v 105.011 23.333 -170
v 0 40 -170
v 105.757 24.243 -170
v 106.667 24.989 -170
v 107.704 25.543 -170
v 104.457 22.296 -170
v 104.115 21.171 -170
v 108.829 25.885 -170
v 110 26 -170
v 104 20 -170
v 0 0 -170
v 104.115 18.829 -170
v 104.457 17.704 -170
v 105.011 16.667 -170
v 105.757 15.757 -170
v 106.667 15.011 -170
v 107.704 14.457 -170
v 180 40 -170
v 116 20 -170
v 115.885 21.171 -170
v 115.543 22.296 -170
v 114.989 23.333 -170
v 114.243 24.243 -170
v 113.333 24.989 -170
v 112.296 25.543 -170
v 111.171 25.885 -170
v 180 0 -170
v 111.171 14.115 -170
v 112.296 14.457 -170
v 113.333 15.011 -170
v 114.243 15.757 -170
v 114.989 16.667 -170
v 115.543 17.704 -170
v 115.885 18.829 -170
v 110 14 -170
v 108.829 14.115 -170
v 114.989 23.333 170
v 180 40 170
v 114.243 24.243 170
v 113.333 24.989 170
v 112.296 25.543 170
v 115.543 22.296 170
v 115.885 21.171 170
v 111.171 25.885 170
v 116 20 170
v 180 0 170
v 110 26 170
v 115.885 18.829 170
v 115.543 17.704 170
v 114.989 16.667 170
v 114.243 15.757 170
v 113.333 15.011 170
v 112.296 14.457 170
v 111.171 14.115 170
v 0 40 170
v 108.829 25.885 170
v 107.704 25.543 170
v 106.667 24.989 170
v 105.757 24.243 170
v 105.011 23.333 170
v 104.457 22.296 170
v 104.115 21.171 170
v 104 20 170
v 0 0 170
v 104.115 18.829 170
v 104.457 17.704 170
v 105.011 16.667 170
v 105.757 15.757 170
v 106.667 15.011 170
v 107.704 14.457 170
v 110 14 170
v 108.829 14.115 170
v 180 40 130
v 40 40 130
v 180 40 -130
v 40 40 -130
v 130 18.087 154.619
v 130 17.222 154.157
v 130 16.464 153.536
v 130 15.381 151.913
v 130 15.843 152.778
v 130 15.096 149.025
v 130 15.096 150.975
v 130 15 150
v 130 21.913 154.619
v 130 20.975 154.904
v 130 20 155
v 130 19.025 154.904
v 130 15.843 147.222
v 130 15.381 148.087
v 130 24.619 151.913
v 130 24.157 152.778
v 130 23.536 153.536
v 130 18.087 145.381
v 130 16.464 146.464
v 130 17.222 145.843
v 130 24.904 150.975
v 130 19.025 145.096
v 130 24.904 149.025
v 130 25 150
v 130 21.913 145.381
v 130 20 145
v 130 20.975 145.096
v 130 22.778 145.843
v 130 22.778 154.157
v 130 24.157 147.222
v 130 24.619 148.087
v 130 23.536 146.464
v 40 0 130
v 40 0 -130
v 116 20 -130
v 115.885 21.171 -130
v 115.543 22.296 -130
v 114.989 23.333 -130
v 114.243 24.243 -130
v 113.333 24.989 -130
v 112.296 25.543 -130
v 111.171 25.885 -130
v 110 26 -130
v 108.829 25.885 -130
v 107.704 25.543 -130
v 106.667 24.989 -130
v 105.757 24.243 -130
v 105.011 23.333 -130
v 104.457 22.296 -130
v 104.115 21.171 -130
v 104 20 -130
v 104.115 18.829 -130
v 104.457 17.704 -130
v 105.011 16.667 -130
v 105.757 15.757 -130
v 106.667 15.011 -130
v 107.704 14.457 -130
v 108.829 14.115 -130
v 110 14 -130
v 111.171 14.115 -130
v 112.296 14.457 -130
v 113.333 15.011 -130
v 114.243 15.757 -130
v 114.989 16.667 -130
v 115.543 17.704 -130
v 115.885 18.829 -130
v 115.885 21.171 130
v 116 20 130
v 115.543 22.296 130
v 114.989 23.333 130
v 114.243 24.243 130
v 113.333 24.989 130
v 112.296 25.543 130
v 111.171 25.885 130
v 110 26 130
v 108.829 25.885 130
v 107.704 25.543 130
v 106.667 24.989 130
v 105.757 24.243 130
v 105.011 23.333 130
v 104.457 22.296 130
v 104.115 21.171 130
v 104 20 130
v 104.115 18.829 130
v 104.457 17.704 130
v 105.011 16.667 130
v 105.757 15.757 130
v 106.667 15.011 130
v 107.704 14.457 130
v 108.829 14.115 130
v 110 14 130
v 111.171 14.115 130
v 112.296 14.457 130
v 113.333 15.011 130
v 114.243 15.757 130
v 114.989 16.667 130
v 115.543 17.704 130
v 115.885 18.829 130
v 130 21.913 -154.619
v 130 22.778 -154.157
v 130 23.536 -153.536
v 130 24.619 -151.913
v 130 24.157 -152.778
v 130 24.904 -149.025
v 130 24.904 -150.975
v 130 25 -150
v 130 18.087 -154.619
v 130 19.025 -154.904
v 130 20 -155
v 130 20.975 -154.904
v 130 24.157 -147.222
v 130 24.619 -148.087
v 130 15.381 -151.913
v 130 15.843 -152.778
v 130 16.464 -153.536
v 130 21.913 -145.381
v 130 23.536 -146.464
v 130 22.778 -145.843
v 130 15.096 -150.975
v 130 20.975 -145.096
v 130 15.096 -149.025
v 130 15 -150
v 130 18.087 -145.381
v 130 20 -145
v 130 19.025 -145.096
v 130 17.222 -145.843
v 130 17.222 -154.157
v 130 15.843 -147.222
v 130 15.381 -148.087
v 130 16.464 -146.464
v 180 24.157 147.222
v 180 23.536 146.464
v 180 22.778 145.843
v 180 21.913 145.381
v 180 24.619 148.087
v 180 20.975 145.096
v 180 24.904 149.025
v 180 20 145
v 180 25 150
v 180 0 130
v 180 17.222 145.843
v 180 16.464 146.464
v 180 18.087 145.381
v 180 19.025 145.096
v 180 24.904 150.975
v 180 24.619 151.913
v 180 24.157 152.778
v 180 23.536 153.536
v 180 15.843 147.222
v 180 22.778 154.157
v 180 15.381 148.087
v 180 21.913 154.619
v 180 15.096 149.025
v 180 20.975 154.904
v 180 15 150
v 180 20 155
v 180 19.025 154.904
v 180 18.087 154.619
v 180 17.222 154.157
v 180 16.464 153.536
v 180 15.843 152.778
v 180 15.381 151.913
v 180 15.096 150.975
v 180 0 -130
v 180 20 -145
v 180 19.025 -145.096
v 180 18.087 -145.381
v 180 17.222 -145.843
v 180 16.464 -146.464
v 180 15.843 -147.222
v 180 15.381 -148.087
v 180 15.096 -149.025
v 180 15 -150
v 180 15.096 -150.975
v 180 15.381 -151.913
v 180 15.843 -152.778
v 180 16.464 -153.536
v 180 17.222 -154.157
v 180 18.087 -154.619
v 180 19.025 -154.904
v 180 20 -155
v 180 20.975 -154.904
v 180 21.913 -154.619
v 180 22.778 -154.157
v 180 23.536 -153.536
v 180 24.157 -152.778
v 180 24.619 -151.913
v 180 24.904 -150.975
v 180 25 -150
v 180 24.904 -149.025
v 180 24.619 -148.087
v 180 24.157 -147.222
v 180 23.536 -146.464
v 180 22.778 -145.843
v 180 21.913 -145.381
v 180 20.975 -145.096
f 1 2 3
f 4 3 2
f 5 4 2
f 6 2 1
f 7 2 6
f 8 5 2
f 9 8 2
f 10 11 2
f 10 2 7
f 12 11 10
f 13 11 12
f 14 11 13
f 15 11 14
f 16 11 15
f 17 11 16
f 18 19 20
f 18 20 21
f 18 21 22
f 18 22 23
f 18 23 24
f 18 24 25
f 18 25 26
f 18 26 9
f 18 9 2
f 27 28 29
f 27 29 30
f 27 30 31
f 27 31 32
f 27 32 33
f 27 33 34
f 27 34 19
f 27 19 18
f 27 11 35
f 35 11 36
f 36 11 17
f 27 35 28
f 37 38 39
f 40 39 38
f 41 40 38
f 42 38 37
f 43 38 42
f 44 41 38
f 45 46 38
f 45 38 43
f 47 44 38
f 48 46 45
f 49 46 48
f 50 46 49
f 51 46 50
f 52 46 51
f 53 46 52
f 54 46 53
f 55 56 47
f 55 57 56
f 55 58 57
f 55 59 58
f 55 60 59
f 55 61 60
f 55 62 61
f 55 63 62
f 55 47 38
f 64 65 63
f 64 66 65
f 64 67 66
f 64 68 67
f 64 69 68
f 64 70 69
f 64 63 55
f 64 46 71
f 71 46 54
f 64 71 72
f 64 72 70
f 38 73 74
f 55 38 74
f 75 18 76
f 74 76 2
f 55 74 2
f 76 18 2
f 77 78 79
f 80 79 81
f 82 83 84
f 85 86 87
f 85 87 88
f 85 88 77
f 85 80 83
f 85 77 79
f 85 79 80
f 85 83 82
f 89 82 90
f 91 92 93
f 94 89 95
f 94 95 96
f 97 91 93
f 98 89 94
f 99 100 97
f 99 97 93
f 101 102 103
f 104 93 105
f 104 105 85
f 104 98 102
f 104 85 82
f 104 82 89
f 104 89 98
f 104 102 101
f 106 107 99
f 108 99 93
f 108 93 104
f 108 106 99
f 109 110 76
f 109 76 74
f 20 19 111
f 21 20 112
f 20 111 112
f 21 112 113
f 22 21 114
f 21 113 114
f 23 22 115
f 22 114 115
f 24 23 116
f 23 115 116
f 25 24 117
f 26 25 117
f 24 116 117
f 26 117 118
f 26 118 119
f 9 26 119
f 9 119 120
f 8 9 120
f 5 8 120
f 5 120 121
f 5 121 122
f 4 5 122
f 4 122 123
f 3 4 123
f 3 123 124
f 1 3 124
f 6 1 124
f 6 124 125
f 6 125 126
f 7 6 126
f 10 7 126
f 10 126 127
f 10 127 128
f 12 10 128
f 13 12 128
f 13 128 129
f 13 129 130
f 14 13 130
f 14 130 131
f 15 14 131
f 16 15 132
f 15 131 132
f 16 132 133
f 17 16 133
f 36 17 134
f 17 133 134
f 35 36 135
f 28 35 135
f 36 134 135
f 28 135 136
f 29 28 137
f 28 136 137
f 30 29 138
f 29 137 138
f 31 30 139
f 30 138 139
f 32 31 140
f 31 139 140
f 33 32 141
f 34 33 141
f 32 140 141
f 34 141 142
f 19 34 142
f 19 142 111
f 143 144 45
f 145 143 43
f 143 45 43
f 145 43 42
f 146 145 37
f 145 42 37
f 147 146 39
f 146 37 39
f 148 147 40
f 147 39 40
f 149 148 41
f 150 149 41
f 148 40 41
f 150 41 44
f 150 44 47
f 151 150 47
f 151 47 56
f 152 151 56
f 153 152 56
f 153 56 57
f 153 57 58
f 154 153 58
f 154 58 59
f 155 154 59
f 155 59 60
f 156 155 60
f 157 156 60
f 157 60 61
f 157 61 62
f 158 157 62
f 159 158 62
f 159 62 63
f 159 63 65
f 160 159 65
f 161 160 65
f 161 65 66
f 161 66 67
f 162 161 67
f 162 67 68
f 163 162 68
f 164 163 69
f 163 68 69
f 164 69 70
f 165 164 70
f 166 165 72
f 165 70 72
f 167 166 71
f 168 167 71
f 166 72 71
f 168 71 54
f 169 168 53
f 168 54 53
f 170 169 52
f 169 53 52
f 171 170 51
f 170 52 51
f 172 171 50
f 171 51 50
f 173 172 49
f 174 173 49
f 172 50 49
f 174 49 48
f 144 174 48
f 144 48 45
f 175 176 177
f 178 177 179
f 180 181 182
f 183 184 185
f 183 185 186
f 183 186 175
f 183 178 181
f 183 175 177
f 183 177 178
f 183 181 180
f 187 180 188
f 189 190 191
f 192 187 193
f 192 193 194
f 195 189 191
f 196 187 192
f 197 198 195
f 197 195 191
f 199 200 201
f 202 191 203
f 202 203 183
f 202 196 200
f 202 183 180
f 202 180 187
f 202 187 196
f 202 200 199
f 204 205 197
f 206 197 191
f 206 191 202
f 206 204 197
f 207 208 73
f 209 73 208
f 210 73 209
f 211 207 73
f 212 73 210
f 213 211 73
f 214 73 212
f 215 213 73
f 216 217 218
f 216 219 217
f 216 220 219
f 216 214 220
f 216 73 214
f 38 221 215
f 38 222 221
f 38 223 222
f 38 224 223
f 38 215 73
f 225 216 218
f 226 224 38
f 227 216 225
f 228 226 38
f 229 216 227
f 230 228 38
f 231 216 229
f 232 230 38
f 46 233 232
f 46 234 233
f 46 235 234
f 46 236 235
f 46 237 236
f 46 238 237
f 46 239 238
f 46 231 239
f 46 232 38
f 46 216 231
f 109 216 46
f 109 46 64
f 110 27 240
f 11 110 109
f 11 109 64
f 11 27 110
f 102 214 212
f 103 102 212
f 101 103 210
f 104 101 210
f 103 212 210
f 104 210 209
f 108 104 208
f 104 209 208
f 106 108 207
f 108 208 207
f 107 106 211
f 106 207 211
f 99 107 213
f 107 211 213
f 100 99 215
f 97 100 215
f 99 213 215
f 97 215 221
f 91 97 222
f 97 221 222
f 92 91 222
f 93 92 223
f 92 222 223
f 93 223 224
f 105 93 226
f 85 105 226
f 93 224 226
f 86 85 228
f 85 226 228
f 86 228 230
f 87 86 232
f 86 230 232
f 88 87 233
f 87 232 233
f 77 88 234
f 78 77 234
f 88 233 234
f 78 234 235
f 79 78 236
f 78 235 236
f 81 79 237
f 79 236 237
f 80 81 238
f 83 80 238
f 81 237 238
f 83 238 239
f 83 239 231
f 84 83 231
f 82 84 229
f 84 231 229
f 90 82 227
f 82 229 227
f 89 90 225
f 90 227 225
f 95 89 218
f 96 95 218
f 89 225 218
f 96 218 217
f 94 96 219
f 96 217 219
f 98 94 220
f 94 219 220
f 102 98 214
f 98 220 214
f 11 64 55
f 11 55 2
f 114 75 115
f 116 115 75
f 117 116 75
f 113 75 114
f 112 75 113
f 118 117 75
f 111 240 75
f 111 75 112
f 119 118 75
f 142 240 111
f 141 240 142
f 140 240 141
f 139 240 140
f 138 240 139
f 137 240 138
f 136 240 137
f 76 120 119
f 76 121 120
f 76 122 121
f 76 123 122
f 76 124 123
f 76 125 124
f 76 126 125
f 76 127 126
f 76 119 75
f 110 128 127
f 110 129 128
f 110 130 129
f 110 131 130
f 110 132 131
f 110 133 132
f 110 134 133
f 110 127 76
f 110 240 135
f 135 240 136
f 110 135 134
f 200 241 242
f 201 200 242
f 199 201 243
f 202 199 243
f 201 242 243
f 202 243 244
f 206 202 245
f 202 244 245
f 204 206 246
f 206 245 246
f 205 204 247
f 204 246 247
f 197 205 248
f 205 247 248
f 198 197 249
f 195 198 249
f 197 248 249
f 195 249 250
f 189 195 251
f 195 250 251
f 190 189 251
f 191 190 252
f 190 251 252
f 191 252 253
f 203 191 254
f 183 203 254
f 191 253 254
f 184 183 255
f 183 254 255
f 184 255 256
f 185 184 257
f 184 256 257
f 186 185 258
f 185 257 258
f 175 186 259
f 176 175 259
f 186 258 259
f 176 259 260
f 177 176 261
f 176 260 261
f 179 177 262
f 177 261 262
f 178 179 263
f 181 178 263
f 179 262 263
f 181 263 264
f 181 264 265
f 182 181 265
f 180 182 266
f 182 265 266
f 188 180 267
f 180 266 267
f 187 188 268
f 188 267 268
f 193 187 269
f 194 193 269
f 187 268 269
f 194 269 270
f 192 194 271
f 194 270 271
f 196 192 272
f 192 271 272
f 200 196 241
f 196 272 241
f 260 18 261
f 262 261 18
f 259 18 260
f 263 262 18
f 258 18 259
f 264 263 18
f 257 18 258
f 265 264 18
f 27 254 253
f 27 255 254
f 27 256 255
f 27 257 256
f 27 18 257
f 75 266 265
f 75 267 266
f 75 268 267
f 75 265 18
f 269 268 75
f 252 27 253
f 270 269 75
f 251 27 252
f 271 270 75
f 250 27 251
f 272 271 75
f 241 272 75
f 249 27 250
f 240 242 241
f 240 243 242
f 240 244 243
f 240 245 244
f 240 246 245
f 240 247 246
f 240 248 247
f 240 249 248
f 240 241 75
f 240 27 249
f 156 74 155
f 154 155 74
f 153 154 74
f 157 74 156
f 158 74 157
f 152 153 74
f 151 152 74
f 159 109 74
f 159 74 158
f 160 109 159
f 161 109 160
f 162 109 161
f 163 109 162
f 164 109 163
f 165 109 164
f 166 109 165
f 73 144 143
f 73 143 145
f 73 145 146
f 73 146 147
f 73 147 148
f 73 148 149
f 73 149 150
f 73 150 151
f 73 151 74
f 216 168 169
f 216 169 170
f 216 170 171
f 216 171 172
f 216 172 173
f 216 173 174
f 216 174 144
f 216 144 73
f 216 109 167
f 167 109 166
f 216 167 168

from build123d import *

# Parameters (mm, degrees)
BOSS_EXTRUDE1_DEPTH = 40
SKETCH2_R           = 6
CUT_EXTRUDE1_DEPTH  = 395
SKETCH3_R           = 5
CUT_EXTRUDE2_DEPTH  = 50


with BuildPart() as part:
    # Sketch1 → Boss-Extrude1 (new body)
    with BuildSketch(Plane(origin=(0, 0, 0), x_dir=(1, 0, 0), z_dir=(0, 1, 0))):
        Polygon((0, 170), (180, 170), (180, 130), (40, 130), (40, -130), (180, -130), (180, -170), (0, -170), align=None)
    extrude(amount=BOSS_EXTRUDE1_DEPTH)

    # Sketch2 → Cut-Extrude1 (cut)
    with BuildSketch(Plane.XY.offset(170)):
        with Locations((110, 20)):
            Circle(SKETCH2_R)
    extrude(amount=-CUT_EXTRUDE1_DEPTH, mode=Mode.SUBTRACT)

    # Sketch3 → Cut-Extrude2 (cut)
    with BuildSketch(Plane(origin=(180, 0, 0), x_dir=(0, 0, -1), z_dir=(1, 0, 0))):
        with Locations((-150, 20)):
            Circle(SKETCH3_R)
        with Locations(Location((150, 20, 0), (0, 0, 180))):
            Circle(SKETCH3_R)
    extrude(amount=-CUT_EXTRUDE2_DEPTH, mode=Mode.SUBTRACT)


solid = part.part
